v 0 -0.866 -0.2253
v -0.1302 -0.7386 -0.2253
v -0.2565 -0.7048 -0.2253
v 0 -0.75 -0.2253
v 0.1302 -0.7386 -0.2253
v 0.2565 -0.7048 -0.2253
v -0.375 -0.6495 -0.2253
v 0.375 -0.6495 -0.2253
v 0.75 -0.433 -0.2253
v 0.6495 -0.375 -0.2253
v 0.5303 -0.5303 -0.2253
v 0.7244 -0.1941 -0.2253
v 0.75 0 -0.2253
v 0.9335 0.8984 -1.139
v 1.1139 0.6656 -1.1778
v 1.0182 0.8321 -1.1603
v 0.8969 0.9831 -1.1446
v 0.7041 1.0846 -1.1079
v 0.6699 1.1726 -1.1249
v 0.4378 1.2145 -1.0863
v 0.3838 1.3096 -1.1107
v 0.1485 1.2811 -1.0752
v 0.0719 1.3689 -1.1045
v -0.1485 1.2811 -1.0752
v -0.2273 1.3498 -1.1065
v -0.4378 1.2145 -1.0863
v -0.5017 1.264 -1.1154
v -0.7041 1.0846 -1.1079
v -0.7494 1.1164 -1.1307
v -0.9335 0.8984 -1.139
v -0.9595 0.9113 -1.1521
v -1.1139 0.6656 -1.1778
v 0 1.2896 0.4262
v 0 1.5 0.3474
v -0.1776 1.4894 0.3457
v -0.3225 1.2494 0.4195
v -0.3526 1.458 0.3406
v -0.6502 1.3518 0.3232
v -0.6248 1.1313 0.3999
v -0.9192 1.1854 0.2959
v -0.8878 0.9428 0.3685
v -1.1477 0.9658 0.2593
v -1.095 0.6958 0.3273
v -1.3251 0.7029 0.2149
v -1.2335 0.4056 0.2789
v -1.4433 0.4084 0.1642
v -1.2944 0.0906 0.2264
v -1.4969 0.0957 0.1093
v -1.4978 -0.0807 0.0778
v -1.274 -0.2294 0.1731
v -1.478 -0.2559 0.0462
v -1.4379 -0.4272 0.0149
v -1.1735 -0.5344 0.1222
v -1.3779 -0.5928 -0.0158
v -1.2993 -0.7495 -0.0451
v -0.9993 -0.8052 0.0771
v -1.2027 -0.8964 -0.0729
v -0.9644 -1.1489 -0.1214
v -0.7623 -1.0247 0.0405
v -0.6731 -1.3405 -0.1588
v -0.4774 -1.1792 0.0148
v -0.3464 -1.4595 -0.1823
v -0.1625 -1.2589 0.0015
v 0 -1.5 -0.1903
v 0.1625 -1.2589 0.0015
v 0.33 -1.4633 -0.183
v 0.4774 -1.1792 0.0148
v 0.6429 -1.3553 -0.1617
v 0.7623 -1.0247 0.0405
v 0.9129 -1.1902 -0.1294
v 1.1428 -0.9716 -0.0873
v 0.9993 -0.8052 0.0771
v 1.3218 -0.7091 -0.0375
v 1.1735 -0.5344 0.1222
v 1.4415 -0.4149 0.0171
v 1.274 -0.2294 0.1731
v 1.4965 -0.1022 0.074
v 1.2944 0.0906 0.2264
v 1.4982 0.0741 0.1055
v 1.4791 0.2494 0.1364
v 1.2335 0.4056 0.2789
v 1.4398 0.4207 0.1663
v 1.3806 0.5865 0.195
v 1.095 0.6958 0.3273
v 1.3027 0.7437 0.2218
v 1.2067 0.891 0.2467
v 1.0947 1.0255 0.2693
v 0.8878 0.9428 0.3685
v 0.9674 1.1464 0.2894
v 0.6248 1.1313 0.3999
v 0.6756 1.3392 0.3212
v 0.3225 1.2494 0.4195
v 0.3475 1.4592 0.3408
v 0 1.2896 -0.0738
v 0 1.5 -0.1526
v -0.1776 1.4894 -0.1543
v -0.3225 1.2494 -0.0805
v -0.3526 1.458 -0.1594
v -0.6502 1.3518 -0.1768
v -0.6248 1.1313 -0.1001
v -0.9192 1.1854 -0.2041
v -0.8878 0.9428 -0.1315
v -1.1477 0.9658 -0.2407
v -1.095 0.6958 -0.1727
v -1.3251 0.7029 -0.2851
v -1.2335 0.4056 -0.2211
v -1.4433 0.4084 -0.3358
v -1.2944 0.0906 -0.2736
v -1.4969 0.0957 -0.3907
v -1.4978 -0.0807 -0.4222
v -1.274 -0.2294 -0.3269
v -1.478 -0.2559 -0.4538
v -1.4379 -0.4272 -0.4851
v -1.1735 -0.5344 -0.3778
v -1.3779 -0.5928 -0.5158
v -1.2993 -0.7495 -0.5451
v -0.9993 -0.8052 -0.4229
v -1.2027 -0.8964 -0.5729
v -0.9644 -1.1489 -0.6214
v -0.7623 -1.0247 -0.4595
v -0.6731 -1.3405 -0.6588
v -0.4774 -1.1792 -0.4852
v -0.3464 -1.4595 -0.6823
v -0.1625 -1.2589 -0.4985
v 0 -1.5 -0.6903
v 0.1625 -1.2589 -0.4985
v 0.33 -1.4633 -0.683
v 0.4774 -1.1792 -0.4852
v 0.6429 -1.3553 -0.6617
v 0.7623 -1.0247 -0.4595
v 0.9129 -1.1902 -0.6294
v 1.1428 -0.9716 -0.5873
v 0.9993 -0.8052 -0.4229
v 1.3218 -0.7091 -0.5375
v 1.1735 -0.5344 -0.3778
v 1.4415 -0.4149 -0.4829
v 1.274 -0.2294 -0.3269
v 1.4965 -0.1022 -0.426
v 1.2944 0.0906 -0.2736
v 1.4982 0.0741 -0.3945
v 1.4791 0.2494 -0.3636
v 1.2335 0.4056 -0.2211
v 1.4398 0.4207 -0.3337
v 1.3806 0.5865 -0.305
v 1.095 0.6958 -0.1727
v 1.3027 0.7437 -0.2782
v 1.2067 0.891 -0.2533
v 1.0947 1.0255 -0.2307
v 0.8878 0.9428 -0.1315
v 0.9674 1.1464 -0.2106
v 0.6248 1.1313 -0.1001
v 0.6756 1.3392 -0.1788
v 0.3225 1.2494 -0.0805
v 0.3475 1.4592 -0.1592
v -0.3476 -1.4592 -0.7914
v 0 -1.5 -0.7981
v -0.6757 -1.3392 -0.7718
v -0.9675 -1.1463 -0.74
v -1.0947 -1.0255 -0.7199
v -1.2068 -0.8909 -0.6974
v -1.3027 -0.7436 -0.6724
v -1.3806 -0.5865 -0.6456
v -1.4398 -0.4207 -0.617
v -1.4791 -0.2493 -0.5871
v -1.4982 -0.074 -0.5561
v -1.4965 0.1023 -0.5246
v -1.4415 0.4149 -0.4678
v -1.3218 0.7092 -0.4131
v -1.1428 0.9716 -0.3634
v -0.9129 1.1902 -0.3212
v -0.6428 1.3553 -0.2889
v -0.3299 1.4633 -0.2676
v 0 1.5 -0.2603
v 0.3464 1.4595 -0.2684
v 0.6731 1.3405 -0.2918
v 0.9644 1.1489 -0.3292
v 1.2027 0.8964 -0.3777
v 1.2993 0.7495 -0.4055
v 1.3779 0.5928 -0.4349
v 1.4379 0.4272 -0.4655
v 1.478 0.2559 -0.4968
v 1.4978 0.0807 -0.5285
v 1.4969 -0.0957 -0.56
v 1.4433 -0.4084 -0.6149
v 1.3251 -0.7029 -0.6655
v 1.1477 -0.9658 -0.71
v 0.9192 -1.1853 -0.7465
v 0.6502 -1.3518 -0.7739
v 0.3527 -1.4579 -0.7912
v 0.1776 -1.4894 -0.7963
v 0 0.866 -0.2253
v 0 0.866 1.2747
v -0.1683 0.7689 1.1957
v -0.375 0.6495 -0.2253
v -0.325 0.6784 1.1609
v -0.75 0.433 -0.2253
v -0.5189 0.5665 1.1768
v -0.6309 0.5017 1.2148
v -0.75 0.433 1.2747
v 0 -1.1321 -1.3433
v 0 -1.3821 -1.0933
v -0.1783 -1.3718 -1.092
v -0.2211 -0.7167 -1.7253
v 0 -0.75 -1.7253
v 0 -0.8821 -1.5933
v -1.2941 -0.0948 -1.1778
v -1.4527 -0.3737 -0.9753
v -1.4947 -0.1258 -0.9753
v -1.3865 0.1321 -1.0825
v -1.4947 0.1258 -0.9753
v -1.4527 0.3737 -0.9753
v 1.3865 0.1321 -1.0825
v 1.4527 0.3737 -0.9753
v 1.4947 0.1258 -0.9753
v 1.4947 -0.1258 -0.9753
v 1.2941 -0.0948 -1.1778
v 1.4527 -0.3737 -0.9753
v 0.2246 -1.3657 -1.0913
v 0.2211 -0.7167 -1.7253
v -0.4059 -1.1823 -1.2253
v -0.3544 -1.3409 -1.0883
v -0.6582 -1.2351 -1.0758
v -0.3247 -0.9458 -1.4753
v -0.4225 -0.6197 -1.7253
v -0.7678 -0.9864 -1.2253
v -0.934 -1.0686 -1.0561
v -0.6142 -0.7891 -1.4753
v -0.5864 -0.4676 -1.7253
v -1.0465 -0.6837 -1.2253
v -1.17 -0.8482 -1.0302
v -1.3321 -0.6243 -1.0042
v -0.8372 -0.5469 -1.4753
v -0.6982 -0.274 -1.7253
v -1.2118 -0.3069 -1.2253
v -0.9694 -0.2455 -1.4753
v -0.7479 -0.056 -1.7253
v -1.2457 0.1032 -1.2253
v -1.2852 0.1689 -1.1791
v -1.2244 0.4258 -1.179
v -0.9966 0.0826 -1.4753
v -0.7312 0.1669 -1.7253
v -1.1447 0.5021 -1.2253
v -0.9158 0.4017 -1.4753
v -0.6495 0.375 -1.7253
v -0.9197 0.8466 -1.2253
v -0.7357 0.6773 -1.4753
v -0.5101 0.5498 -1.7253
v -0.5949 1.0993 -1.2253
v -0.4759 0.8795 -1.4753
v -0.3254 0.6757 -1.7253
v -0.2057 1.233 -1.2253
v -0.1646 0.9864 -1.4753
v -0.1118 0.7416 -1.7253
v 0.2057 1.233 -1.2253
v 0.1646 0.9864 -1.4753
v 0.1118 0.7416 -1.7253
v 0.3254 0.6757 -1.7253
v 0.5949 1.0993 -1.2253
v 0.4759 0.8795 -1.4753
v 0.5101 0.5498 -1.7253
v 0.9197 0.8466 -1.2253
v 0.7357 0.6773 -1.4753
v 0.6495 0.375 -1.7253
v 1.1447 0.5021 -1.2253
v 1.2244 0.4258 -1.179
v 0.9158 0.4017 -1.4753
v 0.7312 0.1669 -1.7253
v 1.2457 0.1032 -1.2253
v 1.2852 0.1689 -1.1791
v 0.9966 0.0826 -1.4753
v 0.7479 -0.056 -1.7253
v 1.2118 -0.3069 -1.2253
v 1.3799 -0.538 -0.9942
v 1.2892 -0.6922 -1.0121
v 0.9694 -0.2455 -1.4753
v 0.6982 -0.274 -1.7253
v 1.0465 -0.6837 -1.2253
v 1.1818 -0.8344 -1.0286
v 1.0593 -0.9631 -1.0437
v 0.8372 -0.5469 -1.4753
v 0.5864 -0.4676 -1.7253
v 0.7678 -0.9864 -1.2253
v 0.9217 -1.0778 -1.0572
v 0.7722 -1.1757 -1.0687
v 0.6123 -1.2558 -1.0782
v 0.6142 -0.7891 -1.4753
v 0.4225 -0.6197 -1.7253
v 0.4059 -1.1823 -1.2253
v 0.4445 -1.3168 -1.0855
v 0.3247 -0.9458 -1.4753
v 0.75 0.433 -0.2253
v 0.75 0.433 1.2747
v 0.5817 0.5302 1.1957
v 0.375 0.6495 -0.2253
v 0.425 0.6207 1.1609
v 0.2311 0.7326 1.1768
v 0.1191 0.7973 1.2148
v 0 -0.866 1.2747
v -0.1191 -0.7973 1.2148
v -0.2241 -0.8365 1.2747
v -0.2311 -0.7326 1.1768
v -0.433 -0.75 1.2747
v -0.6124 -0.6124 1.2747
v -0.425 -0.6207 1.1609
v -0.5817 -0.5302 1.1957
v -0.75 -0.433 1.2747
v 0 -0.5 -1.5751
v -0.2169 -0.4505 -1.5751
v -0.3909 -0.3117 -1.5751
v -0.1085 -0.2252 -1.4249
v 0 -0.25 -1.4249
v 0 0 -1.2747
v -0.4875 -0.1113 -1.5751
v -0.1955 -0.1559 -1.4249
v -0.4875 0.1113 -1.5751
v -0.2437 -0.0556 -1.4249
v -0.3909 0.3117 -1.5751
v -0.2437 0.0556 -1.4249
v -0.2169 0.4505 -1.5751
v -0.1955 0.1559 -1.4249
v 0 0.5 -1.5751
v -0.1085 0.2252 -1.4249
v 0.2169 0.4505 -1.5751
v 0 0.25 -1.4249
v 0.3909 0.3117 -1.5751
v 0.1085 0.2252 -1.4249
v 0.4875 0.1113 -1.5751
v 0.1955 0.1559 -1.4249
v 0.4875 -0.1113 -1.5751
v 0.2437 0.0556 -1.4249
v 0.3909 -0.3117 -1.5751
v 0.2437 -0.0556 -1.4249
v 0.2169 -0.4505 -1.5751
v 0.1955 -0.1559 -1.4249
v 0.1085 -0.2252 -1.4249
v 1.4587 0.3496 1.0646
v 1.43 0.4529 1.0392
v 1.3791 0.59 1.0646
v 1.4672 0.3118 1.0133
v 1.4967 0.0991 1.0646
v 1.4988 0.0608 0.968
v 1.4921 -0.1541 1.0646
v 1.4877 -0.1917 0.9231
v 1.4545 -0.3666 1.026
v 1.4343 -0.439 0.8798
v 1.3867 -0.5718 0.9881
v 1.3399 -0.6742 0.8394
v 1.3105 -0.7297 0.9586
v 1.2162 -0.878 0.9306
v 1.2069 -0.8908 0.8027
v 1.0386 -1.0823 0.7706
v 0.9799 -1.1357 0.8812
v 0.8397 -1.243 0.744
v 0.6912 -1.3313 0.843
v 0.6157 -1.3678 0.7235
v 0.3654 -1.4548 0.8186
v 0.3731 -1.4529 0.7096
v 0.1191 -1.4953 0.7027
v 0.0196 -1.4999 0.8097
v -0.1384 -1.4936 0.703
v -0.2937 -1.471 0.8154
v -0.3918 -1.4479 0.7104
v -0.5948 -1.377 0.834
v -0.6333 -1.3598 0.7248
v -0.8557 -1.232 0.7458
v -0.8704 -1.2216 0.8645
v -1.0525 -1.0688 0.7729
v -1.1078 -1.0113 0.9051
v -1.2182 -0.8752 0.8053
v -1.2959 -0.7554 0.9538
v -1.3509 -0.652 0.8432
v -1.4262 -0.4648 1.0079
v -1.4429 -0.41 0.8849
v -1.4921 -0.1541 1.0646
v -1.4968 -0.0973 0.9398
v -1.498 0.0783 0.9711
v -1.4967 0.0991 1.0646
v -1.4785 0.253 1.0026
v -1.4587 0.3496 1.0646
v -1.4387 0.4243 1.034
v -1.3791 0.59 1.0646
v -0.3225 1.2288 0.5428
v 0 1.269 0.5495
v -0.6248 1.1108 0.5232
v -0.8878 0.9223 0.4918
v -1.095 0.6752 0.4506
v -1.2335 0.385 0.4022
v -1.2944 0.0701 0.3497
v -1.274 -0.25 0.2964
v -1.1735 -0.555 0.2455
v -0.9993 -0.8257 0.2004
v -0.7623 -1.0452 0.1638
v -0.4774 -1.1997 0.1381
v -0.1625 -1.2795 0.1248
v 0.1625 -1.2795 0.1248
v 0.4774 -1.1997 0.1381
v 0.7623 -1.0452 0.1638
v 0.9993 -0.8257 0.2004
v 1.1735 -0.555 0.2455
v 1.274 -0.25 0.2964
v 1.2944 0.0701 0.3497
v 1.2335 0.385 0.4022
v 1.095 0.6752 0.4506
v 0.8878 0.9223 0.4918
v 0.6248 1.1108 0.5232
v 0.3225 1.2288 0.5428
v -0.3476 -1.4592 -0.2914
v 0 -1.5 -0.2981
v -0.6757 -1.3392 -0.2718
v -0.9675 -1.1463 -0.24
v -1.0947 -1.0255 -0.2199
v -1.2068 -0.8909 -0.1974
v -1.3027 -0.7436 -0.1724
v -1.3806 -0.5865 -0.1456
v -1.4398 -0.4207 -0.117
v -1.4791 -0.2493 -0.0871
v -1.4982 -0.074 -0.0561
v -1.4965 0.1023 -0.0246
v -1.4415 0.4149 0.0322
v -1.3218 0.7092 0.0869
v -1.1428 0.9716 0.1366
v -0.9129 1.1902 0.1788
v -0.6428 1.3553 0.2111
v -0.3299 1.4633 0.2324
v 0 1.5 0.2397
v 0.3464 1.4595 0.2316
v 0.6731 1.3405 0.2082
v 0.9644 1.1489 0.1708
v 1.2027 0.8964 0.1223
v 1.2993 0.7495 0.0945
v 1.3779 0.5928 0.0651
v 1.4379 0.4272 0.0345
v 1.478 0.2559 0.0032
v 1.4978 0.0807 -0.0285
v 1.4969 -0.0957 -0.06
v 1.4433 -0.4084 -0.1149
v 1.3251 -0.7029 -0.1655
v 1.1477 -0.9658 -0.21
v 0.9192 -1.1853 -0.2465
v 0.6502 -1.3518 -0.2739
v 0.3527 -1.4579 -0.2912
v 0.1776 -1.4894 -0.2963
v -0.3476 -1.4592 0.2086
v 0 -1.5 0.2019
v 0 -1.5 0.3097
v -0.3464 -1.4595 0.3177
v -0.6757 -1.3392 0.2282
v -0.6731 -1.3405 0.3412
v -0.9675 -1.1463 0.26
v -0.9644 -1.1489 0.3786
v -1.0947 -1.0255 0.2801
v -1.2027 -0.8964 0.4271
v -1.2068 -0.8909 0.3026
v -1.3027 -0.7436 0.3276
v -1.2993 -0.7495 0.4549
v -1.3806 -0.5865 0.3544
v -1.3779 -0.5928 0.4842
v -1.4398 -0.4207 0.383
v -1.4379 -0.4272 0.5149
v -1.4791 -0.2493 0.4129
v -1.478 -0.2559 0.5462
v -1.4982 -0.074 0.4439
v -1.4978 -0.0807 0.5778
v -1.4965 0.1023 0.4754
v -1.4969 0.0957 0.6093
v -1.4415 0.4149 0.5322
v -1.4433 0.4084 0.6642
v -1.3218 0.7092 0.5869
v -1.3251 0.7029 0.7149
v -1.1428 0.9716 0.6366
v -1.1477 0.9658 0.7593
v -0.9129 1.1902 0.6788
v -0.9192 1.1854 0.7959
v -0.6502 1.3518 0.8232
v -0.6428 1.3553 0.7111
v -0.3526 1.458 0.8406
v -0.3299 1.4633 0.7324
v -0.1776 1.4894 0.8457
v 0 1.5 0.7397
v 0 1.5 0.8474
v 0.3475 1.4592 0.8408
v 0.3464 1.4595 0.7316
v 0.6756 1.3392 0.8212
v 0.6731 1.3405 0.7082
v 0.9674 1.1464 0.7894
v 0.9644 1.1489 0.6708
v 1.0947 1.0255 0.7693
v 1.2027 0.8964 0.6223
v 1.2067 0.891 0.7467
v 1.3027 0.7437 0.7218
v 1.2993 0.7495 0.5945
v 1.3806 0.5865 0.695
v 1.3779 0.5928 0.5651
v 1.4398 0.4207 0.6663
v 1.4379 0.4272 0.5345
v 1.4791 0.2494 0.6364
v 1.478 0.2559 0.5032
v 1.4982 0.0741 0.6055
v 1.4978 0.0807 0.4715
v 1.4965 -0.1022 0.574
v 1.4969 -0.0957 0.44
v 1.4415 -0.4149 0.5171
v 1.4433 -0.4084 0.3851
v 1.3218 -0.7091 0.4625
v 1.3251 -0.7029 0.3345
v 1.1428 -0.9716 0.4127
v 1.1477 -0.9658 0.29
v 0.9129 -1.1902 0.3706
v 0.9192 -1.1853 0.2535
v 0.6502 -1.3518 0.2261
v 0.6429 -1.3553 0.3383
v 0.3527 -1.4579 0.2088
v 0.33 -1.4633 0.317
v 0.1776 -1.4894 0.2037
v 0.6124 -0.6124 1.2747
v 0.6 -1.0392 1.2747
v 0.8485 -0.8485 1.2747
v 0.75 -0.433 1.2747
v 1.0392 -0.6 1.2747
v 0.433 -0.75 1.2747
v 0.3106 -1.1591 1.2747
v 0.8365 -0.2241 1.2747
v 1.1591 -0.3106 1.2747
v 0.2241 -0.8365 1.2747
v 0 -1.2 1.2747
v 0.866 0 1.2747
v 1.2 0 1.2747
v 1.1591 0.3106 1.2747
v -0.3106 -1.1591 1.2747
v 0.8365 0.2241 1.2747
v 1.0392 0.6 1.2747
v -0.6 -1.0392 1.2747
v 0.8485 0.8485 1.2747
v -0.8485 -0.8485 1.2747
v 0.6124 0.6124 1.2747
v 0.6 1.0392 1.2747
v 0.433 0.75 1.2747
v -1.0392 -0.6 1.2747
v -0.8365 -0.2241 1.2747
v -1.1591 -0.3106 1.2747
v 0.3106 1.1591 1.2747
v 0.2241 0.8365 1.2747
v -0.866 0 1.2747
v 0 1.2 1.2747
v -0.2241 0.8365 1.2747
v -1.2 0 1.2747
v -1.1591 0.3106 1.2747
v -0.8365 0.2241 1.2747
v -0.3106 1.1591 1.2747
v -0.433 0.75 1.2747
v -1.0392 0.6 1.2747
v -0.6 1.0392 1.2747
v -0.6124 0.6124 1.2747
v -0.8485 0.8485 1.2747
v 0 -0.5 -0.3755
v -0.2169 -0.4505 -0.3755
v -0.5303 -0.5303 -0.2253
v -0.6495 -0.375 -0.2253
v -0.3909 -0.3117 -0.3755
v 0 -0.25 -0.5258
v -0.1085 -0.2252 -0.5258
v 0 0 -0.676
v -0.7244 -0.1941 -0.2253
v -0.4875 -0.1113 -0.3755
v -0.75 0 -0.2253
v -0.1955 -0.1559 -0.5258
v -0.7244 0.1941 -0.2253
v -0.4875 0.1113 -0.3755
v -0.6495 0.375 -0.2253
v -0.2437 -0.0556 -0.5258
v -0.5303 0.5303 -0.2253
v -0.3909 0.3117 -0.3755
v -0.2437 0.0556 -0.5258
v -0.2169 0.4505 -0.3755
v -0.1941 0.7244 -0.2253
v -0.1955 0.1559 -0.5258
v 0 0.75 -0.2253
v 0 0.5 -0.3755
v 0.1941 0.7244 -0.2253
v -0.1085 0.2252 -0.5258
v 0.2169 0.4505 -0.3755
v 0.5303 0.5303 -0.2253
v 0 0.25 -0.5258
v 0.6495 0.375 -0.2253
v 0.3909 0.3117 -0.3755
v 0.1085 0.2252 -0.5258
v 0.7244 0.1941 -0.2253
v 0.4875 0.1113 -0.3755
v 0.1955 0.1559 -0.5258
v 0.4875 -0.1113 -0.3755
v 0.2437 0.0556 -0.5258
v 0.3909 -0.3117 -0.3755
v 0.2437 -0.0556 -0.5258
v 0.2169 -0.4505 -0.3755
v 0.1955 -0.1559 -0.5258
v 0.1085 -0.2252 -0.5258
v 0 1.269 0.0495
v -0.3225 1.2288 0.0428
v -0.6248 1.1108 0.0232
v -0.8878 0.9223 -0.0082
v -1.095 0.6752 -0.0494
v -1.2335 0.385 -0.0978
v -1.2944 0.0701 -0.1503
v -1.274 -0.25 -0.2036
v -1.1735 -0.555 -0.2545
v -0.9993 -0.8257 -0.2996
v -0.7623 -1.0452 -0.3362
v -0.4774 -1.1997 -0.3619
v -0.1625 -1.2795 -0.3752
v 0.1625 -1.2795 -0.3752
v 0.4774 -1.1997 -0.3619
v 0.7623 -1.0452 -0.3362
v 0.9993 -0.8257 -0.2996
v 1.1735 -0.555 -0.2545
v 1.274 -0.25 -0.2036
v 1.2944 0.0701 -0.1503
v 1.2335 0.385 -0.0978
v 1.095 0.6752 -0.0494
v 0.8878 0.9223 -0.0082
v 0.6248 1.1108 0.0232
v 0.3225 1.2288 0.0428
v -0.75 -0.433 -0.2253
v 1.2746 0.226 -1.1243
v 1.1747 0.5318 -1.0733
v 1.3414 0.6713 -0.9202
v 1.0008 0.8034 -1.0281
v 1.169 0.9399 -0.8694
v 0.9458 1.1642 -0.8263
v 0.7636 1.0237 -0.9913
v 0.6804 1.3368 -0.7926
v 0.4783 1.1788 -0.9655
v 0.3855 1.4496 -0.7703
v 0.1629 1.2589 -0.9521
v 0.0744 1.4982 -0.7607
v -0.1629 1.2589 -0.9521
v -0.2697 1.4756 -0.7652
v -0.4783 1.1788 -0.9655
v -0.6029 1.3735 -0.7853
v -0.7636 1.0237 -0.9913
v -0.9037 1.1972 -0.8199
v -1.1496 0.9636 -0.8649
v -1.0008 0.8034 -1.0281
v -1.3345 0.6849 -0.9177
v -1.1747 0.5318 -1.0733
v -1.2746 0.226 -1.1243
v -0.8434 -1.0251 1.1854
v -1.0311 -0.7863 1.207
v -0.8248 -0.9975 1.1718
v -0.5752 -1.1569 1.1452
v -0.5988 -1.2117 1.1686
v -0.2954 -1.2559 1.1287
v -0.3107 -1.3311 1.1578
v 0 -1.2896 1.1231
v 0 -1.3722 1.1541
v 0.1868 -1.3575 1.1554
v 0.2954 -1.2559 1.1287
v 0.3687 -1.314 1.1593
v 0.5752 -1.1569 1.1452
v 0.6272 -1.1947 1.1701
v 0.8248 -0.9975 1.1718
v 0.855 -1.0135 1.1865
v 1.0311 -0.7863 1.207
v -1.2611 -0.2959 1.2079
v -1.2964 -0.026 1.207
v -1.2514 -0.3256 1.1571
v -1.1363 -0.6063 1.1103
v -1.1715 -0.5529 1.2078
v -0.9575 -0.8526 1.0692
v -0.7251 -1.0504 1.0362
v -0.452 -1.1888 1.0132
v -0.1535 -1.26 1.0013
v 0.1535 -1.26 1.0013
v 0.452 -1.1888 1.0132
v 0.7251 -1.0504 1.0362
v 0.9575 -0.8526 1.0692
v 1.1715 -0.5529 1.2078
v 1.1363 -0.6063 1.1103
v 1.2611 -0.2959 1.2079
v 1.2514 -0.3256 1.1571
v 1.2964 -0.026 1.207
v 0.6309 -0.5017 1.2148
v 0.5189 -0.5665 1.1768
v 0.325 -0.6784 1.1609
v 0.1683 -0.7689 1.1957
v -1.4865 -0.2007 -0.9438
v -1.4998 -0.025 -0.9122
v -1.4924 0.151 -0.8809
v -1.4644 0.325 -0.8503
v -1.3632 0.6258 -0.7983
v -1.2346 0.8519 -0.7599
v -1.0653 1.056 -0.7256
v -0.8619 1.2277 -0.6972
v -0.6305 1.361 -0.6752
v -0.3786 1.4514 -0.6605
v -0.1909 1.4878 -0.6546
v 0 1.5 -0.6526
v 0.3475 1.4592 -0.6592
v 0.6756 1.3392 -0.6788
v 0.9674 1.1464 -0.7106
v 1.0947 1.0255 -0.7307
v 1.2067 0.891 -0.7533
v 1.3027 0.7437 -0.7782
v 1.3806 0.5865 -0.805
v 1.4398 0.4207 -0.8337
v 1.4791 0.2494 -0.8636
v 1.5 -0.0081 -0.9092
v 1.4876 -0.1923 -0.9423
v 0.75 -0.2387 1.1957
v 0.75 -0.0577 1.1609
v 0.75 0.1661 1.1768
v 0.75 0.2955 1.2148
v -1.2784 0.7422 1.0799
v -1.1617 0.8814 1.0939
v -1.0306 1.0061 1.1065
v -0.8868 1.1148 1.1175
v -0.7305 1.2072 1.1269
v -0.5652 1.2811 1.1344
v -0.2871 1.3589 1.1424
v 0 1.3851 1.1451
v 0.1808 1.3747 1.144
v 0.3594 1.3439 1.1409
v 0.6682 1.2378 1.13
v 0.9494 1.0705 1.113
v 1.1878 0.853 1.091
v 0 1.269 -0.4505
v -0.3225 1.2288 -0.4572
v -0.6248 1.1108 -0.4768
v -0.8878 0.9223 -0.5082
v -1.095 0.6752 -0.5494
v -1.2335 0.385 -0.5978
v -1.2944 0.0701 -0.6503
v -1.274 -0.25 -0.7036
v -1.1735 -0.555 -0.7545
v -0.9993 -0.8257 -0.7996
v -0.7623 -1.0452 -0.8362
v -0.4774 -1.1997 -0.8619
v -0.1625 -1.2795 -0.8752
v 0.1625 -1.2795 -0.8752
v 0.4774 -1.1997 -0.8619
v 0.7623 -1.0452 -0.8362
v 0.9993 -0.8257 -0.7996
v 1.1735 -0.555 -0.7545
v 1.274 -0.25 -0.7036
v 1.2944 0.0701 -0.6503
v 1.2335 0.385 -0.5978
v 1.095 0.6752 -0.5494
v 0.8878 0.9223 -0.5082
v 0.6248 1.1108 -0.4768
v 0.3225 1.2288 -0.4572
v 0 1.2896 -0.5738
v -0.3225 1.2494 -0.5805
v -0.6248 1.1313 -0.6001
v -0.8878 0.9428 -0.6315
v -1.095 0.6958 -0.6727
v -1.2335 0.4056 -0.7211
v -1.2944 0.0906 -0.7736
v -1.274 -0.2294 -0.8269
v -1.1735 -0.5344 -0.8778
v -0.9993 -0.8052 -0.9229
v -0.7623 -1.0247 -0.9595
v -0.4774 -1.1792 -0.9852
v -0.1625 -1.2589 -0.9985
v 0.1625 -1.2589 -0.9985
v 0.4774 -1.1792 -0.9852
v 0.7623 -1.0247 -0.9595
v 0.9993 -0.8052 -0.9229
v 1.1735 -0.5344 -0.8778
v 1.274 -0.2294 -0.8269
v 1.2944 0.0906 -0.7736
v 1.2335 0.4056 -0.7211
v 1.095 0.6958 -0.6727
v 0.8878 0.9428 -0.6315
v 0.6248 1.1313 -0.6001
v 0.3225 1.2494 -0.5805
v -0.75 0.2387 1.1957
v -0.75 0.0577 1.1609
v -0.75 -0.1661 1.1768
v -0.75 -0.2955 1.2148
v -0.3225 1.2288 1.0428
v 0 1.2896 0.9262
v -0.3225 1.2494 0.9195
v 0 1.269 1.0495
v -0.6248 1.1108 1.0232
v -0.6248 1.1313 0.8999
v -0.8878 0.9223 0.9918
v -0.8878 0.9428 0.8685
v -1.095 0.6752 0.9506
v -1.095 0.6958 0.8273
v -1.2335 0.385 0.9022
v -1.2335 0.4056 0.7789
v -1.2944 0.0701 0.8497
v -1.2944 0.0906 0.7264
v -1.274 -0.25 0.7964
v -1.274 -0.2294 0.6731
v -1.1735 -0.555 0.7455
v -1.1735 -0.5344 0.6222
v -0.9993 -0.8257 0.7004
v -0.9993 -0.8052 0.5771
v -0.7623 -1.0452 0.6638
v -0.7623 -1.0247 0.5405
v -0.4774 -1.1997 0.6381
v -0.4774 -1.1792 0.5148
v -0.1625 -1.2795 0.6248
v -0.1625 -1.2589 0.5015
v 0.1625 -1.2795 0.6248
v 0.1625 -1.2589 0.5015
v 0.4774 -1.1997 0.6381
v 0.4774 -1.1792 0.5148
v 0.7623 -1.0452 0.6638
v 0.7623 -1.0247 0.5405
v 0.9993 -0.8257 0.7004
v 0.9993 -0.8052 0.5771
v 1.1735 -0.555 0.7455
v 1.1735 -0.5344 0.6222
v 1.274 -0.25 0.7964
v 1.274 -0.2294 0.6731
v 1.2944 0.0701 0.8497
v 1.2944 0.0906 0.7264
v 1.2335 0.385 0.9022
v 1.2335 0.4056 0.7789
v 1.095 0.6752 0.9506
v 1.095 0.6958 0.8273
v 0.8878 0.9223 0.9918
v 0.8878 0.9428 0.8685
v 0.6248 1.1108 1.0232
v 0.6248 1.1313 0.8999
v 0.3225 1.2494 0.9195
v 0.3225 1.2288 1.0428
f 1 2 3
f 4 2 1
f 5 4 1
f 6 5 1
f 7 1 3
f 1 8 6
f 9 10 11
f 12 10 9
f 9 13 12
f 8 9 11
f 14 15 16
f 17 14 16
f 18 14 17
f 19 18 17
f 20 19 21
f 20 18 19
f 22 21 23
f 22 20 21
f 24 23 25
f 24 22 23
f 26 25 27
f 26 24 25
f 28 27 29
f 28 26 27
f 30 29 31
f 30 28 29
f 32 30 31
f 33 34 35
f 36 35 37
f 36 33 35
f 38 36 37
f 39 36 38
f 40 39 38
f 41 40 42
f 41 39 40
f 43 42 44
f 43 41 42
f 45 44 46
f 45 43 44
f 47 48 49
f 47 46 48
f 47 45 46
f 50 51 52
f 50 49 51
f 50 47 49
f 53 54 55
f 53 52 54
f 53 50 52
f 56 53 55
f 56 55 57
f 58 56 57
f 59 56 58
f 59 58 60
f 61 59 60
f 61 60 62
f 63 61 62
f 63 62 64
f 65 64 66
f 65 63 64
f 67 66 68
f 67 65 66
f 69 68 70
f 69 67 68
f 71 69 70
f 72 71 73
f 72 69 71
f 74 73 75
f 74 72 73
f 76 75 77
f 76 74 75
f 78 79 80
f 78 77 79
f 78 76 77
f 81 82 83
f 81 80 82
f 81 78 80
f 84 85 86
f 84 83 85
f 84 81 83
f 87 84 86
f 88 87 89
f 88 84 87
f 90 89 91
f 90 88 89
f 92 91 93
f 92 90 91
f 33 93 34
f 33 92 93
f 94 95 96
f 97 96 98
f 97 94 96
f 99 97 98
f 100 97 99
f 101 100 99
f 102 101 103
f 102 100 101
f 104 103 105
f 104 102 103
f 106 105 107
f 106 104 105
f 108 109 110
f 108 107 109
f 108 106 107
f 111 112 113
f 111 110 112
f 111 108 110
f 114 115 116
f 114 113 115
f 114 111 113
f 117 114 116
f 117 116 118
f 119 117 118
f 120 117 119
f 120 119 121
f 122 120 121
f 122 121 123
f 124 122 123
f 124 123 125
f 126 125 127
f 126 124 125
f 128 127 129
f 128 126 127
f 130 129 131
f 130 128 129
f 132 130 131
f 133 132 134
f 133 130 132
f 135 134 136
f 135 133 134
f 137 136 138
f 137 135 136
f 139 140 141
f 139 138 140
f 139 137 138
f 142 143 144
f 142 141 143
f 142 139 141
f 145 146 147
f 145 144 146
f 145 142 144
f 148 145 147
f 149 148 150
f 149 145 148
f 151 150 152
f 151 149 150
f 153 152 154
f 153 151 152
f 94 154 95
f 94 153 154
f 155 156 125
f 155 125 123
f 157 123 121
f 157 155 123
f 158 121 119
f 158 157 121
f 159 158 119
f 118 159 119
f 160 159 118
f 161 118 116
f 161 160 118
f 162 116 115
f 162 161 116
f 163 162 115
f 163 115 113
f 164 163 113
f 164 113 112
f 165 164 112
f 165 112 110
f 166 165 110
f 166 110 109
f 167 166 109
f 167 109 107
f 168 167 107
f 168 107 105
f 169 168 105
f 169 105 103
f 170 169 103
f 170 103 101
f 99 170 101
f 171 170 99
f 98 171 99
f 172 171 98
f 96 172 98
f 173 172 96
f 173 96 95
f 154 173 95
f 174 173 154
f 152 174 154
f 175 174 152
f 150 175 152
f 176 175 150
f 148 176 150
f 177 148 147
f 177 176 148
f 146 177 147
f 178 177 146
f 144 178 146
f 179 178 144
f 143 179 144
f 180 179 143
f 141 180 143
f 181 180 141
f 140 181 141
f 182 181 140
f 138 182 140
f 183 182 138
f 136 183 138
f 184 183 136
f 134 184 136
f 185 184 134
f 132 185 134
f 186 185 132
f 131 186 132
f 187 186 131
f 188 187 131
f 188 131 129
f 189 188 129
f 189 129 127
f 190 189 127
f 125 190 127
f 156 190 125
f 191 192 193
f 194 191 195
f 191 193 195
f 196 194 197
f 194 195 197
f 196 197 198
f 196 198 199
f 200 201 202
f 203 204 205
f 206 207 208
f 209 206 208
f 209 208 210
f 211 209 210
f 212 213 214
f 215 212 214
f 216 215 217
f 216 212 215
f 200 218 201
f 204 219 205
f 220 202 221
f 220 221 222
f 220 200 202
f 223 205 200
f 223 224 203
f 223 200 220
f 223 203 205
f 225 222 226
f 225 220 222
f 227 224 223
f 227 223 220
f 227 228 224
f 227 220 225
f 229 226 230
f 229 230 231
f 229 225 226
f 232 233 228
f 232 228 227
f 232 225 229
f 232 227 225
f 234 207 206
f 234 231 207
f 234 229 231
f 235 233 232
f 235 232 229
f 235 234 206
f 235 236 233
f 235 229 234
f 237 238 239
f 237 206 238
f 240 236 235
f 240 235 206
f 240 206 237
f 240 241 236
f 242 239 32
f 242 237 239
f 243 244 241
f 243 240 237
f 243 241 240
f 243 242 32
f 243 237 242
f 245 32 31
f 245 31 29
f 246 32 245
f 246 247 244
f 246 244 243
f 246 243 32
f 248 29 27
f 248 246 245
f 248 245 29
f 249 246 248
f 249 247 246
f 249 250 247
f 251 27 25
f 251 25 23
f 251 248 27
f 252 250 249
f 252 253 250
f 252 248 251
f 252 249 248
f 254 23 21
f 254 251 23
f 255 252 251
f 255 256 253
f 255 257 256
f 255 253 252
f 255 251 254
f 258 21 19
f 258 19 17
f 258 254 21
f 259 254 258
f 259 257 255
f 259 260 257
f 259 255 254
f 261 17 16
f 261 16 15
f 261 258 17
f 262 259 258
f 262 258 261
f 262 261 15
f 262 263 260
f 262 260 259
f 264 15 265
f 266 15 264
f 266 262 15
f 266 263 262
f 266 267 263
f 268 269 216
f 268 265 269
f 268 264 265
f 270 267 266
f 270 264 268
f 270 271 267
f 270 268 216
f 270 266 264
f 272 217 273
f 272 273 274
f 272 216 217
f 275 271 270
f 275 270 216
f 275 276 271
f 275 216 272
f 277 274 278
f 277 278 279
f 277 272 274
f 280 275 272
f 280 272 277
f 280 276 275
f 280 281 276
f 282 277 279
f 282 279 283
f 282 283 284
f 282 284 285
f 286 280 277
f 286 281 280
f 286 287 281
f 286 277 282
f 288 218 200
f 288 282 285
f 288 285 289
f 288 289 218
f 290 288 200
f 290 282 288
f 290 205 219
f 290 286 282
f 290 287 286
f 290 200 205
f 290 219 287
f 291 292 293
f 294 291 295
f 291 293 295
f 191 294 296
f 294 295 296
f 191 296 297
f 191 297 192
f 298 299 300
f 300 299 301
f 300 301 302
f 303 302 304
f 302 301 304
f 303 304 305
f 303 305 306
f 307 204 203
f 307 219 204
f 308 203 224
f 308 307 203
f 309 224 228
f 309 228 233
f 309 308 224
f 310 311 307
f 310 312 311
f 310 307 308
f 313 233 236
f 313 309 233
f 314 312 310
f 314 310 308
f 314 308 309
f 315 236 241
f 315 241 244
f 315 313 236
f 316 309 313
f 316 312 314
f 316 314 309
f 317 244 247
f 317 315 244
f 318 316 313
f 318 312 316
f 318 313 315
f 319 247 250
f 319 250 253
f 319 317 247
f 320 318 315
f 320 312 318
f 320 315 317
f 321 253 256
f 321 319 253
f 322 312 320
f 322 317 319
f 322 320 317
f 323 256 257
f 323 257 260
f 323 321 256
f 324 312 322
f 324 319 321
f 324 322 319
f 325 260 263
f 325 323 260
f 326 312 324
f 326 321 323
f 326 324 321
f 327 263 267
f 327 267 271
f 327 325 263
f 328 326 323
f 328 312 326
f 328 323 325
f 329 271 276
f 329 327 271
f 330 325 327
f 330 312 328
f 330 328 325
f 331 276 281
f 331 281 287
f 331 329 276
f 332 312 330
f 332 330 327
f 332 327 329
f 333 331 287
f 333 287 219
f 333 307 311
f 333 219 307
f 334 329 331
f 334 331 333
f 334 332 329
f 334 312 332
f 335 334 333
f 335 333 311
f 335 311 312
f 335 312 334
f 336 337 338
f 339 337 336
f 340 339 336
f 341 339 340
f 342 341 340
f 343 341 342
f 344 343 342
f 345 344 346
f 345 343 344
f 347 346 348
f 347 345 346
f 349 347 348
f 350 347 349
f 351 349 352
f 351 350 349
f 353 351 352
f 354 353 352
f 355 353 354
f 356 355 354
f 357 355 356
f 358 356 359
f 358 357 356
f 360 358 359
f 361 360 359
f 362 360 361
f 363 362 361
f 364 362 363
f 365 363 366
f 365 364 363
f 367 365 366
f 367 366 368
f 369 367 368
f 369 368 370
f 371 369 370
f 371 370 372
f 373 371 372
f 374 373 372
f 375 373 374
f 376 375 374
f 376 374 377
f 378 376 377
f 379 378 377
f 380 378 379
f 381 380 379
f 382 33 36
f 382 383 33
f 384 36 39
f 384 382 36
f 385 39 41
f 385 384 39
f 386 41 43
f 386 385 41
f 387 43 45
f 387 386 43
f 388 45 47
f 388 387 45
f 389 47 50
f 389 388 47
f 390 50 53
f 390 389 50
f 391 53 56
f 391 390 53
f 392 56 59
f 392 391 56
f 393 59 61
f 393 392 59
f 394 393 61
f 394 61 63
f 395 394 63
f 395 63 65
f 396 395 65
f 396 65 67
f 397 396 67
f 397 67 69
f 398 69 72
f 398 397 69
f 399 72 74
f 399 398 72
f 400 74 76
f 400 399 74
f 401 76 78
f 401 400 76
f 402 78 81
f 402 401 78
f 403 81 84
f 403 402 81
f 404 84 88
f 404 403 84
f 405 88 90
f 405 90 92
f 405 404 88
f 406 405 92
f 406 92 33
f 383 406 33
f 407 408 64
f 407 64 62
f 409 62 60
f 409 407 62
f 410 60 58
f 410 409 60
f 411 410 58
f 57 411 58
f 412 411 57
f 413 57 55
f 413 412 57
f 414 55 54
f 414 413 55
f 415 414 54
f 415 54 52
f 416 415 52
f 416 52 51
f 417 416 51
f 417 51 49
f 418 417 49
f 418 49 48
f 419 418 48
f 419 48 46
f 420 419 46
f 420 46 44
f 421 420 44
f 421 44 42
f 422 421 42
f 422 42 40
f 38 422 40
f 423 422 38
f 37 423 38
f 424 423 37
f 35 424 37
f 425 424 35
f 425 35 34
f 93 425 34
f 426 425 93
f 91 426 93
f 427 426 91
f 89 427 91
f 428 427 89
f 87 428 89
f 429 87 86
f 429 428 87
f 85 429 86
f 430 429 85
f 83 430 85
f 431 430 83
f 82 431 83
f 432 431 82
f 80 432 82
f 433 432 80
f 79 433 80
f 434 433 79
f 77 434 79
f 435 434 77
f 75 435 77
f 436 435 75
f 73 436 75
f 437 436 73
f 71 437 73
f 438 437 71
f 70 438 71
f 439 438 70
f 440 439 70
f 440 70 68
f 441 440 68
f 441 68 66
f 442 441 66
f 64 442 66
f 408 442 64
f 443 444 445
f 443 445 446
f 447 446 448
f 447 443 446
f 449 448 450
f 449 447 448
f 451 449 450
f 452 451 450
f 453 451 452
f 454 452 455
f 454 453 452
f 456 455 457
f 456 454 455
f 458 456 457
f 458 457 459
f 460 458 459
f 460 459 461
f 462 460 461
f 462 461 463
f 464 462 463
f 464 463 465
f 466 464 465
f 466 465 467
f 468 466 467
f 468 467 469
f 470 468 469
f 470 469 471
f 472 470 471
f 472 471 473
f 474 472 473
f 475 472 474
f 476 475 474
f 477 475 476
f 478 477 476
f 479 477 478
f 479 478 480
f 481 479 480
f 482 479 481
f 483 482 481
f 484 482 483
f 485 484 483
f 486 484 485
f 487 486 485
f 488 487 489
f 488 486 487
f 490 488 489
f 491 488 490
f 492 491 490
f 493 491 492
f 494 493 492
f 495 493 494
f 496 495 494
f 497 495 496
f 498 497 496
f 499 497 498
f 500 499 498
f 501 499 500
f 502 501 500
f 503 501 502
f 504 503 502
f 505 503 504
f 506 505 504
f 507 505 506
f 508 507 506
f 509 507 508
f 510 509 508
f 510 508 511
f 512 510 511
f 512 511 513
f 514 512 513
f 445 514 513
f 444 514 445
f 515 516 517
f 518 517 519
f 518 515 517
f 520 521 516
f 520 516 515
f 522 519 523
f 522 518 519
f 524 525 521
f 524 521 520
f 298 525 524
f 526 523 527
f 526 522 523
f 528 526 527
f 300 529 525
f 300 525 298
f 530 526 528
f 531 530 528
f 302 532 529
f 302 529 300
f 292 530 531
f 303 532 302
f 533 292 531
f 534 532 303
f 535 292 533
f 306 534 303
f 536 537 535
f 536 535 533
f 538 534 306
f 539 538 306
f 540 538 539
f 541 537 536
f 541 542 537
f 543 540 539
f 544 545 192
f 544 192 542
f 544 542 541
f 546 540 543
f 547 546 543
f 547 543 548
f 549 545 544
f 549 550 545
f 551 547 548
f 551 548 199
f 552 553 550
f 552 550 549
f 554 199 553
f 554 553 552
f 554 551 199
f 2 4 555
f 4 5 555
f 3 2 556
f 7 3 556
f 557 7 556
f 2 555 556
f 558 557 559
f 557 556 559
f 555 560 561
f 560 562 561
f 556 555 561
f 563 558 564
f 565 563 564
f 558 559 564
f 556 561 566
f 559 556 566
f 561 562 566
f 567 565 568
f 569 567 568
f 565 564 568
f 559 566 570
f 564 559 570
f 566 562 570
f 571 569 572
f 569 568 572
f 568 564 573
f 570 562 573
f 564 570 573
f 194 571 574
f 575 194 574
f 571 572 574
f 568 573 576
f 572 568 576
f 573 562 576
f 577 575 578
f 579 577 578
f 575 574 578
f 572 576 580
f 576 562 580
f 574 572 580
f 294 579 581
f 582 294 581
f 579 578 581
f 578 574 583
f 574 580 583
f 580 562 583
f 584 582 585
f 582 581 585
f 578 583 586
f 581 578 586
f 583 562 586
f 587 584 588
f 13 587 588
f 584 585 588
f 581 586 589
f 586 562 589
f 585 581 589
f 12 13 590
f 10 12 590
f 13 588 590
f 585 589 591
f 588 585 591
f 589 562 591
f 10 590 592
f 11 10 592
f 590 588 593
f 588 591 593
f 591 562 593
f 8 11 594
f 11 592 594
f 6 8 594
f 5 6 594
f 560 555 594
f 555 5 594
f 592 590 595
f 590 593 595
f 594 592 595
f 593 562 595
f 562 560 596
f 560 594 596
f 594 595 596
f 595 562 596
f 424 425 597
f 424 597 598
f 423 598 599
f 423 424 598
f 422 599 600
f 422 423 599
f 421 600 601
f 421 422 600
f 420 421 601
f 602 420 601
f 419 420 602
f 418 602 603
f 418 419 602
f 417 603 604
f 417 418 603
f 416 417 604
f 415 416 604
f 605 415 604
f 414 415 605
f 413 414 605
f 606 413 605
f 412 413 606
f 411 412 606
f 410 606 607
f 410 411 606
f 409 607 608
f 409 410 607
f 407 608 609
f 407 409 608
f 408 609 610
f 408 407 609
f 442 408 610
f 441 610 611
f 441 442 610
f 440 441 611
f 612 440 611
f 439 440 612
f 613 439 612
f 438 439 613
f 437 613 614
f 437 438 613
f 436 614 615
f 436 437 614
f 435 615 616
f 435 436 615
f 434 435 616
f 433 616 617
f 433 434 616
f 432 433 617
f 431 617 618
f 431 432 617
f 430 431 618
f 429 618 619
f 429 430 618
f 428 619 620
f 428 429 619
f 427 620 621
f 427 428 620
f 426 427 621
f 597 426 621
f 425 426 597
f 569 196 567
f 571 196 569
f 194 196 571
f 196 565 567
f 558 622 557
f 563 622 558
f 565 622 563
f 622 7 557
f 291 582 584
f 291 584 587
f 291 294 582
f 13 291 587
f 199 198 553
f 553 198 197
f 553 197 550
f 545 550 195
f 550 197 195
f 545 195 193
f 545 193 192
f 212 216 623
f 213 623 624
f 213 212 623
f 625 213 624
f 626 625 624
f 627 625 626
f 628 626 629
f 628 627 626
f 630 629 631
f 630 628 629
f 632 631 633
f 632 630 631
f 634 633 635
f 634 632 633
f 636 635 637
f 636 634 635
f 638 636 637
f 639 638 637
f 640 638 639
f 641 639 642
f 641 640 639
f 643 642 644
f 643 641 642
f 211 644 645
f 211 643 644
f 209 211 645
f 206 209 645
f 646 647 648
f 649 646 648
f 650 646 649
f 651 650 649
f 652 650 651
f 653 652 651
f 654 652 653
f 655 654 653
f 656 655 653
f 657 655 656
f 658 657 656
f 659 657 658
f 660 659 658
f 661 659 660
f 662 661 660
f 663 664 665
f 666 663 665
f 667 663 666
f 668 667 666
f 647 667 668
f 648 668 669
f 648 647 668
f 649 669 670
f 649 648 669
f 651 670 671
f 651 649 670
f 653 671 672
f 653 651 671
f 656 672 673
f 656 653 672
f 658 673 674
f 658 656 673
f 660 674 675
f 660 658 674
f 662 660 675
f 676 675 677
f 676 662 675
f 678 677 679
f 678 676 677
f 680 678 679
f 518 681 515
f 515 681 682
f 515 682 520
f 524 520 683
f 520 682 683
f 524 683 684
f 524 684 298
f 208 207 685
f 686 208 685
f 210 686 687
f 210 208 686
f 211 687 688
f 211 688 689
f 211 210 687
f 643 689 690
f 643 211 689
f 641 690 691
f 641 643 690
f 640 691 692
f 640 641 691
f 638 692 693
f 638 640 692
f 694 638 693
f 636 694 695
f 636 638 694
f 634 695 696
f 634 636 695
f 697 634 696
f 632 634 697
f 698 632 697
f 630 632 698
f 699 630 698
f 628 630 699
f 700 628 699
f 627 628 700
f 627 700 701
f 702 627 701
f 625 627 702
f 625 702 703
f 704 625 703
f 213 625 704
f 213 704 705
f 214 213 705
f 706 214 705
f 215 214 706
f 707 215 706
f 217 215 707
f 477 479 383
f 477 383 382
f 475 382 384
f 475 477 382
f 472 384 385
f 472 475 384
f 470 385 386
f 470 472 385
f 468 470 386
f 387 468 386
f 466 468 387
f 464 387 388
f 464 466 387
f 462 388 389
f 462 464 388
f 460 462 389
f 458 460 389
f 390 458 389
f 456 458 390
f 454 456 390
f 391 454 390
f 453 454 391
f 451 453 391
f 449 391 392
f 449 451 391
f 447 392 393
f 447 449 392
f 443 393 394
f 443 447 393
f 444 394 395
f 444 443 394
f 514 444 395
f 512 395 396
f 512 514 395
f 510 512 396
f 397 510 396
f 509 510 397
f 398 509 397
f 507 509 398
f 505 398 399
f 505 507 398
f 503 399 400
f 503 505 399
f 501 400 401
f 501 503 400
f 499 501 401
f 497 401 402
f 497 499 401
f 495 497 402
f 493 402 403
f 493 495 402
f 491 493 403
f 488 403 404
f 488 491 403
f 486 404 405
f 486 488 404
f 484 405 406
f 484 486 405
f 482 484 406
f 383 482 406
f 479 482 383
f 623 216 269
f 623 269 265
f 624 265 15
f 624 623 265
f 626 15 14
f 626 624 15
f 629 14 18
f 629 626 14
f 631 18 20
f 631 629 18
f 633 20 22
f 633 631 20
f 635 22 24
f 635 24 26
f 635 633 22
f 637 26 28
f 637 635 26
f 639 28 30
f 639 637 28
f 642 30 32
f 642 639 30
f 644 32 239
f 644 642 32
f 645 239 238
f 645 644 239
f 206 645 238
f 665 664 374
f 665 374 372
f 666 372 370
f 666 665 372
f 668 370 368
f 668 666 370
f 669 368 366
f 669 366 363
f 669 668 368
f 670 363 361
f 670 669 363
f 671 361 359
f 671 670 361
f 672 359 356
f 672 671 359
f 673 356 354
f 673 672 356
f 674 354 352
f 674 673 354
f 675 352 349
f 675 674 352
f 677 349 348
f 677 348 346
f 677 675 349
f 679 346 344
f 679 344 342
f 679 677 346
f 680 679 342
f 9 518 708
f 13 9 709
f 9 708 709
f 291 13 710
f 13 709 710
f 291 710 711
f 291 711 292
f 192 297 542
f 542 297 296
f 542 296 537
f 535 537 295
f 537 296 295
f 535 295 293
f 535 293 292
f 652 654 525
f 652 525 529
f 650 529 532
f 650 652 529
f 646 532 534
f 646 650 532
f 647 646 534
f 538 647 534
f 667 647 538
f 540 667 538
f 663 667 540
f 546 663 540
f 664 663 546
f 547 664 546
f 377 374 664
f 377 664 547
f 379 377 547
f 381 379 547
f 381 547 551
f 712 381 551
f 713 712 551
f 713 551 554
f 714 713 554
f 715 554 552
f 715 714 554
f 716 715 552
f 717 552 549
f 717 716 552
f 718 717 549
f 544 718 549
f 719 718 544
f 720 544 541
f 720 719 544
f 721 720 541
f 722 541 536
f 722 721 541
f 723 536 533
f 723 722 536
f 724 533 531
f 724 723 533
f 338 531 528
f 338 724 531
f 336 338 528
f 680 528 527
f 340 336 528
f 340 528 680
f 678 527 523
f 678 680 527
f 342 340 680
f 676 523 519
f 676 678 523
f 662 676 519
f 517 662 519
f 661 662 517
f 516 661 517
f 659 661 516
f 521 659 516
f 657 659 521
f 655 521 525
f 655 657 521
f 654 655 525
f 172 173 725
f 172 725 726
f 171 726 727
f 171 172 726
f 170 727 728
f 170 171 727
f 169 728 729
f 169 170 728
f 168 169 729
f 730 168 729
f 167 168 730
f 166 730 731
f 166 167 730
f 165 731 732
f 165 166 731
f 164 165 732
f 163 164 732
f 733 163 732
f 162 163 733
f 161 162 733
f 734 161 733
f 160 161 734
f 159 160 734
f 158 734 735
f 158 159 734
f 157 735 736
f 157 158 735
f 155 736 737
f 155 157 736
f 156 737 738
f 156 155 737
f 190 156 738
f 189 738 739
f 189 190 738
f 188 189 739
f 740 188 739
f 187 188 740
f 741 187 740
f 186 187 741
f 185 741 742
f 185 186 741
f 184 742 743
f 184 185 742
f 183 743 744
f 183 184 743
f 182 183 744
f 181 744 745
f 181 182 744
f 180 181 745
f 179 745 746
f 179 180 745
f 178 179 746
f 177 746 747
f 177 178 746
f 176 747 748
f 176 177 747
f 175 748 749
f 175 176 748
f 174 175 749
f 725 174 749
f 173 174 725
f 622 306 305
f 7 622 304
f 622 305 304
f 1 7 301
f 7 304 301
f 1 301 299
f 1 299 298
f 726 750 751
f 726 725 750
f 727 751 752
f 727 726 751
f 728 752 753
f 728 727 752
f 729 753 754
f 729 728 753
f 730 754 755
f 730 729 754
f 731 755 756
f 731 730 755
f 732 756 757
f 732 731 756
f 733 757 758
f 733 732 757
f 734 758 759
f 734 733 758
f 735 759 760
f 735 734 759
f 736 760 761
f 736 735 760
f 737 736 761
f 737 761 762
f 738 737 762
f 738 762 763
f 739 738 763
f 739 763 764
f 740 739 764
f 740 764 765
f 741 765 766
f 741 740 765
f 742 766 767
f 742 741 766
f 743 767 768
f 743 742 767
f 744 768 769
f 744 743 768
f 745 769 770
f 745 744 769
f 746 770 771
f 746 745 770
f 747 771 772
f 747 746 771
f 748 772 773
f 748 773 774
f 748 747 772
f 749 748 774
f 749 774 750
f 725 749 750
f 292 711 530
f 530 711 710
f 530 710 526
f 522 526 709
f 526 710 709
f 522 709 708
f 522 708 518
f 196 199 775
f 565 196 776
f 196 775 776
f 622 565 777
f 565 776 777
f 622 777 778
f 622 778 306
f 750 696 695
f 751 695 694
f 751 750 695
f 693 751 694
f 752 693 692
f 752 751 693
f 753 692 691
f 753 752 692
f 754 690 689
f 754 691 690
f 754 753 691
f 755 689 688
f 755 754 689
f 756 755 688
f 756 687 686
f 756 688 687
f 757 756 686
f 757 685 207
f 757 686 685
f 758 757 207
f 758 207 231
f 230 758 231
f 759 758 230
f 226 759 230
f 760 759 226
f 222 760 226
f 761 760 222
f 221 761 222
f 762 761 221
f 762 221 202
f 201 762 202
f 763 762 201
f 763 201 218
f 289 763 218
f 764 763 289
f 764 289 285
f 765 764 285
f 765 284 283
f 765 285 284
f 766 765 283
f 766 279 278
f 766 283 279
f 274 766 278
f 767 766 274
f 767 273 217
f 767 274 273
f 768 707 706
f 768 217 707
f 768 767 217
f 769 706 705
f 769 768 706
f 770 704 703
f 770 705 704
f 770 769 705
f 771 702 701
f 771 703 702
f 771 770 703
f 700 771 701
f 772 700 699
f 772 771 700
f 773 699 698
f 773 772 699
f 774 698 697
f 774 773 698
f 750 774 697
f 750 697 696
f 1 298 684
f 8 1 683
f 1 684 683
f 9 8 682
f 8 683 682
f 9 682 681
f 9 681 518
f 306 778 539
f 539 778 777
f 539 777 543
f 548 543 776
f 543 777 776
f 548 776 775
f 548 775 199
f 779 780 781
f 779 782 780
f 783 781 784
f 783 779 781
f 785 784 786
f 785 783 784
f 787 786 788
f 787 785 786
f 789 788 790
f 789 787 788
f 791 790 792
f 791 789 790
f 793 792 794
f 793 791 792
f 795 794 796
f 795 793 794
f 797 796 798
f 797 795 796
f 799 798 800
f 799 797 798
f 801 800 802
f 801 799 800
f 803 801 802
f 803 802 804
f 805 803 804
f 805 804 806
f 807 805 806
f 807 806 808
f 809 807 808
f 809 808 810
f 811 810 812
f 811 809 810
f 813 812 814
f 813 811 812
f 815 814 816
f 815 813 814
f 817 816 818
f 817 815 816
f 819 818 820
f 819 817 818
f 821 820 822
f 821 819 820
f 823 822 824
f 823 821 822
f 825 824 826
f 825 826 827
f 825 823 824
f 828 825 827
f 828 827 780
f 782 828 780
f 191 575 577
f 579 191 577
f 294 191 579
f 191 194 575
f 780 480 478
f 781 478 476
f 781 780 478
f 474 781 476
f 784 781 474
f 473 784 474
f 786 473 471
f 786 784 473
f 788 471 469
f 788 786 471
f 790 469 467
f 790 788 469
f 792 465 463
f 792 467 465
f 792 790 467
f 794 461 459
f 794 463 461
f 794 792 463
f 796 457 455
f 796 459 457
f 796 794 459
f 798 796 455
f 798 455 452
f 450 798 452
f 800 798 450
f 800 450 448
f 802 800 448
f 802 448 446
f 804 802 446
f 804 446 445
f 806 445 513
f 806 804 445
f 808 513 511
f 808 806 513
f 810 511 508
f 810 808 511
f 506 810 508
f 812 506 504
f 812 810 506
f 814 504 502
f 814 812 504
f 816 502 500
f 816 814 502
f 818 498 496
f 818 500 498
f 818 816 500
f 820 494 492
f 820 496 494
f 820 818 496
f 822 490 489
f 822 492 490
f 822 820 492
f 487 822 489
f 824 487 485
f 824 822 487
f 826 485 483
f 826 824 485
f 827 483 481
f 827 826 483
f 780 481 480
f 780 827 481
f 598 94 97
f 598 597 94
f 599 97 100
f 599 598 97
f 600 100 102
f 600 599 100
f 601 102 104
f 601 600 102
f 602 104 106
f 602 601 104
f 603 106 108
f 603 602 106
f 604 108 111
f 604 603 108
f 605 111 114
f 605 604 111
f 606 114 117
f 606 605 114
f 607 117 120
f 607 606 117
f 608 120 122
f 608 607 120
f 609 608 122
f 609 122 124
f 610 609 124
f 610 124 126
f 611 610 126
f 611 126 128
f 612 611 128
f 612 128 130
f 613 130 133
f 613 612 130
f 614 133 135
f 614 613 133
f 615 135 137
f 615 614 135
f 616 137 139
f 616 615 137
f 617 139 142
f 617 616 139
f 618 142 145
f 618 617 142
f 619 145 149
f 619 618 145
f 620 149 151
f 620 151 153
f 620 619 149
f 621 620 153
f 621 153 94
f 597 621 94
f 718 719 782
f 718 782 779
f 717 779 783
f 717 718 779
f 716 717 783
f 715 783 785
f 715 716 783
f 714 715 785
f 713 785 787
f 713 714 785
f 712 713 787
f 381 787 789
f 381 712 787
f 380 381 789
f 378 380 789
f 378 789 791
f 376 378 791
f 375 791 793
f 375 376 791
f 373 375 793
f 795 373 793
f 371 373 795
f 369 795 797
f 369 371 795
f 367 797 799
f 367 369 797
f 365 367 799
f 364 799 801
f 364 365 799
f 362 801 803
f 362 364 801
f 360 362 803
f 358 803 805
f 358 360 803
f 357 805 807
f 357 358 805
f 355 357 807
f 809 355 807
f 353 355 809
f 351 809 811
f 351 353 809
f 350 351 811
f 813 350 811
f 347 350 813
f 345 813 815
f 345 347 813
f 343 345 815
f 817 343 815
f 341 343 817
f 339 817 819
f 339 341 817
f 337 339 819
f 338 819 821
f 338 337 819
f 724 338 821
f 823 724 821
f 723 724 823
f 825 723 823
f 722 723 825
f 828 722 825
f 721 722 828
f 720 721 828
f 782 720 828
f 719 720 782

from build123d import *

# Parameters (mm, degrees)
LPATTERN1_COUNT     = 5
LPATTERN1_PITCH     = 0.5
LPATTERN1_COL_COUNT = 2
LPATTERN1_COL_PITCH = 0.5
CUT_EXTRUDE10_DEPTH = 1.5


with BuildPart() as part:
    # Sketch22 → Revolve1 (revolve)
    with BuildSketch(Plane(origin=(0, 0, 0), x_dir=(0, 0, -1), z_dir=(1, 0, 0)), mode=Mode.PRIVATE) as revolve1_sk:
        Polygon((-1.274677268, 0), (-1.274677268, 1.2), (-1.064615006, 1.5), (0.975322732, 1.5), (1.725322732, 0.75), (1.274677268, 0), align=None)
    revolve(revolve1_sk.sketch.rotate(Axis((0, 0, -1.274677268), (0, 0, -1)), 180), axis=Axis((0, 0, -1.274677268), (0, 0, -1)))

    # Sketch6 → Cut-Revolve8 (revolve, cut)
    with BuildSketch(Plane(origin=(0, 0, 0), x_dir=(0, 0, -1), z_dir=(1, 0, 0))):
        Polygon((0.573757931, 1.289561466), (0.45045869, 1.269011592), (0.251842859, 1.510274937), (0.6833902, 1.582199494), align=None)
    cut_revolve8 = revolve(axis=Axis((0, 0.089188249, -1.260452226), (0, -0.16439898730536787, 0.986393923832142)), mode=Mode.SUBTRACT)

    # LPattern1: Cut-Revolve8 ×5
    with Locations(*[(0, 0, i * LPATTERN1_PITCH) for i in range(1, LPATTERN1_COUNT)]):
        add(cut_revolve8, mode=Mode.SUBTRACT)

    # LPattern1 col: Cut-Revolve8 ×2
    with Locations(*[(0, 0, -i * LPATTERN1_COL_PITCH) for i in range(1, LPATTERN1_COL_COUNT)]):
        add(cut_revolve8, mode=Mode.SUBTRACT)

    # Sketch23 → Cut-Extrude10 (cut)
    with BuildSketch(Plane.XY.offset(1.274677268)):
        Polygon((0, 0.866025404), (-0.75, 0.433012702), (-0.75, -0.433012702), (0, -0.866025404), (0.75, -0.433012702), (0.75, 0.433012702), align=None)
    extrude(amount=-CUT_EXTRUDE10_DEPTH, mode=Mode.SUBTRACT)

    # Cut-Extrude11 cone 1 section (through the dimple's axis) → Cut-Extrude11 (revolve, cut)
    with BuildSketch(Plane(origin=(0, 0, 1.274677268), x_dir=(0, -1, 0), z_dir=(1, 0, 0))):
        Polygon((0, 0), (0.866025404, 0), (0, 0.866025404), align=None)
    revolve(axis=Axis((0, 0, 1.274677268), (0, 0, -1)), mode=Mode.SUBTRACT)

    # Cut-Extrude12 cone 1 section (through the dimple's axis) → Cut-Extrude12 (revolve, cut)
    with BuildSketch(Plane(origin=(0, 0, -0.225322732), x_dir=(0, -1, 0), z_dir=(1, 0, 0))):
        Polygon((0, 0), (0.75, 0), (0, 0.450645464), align=None)
    revolve(axis=Axis((0, 0, -0.225322732), (0, 0, -1)), mode=Mode.SUBTRACT)


solid = part.part
